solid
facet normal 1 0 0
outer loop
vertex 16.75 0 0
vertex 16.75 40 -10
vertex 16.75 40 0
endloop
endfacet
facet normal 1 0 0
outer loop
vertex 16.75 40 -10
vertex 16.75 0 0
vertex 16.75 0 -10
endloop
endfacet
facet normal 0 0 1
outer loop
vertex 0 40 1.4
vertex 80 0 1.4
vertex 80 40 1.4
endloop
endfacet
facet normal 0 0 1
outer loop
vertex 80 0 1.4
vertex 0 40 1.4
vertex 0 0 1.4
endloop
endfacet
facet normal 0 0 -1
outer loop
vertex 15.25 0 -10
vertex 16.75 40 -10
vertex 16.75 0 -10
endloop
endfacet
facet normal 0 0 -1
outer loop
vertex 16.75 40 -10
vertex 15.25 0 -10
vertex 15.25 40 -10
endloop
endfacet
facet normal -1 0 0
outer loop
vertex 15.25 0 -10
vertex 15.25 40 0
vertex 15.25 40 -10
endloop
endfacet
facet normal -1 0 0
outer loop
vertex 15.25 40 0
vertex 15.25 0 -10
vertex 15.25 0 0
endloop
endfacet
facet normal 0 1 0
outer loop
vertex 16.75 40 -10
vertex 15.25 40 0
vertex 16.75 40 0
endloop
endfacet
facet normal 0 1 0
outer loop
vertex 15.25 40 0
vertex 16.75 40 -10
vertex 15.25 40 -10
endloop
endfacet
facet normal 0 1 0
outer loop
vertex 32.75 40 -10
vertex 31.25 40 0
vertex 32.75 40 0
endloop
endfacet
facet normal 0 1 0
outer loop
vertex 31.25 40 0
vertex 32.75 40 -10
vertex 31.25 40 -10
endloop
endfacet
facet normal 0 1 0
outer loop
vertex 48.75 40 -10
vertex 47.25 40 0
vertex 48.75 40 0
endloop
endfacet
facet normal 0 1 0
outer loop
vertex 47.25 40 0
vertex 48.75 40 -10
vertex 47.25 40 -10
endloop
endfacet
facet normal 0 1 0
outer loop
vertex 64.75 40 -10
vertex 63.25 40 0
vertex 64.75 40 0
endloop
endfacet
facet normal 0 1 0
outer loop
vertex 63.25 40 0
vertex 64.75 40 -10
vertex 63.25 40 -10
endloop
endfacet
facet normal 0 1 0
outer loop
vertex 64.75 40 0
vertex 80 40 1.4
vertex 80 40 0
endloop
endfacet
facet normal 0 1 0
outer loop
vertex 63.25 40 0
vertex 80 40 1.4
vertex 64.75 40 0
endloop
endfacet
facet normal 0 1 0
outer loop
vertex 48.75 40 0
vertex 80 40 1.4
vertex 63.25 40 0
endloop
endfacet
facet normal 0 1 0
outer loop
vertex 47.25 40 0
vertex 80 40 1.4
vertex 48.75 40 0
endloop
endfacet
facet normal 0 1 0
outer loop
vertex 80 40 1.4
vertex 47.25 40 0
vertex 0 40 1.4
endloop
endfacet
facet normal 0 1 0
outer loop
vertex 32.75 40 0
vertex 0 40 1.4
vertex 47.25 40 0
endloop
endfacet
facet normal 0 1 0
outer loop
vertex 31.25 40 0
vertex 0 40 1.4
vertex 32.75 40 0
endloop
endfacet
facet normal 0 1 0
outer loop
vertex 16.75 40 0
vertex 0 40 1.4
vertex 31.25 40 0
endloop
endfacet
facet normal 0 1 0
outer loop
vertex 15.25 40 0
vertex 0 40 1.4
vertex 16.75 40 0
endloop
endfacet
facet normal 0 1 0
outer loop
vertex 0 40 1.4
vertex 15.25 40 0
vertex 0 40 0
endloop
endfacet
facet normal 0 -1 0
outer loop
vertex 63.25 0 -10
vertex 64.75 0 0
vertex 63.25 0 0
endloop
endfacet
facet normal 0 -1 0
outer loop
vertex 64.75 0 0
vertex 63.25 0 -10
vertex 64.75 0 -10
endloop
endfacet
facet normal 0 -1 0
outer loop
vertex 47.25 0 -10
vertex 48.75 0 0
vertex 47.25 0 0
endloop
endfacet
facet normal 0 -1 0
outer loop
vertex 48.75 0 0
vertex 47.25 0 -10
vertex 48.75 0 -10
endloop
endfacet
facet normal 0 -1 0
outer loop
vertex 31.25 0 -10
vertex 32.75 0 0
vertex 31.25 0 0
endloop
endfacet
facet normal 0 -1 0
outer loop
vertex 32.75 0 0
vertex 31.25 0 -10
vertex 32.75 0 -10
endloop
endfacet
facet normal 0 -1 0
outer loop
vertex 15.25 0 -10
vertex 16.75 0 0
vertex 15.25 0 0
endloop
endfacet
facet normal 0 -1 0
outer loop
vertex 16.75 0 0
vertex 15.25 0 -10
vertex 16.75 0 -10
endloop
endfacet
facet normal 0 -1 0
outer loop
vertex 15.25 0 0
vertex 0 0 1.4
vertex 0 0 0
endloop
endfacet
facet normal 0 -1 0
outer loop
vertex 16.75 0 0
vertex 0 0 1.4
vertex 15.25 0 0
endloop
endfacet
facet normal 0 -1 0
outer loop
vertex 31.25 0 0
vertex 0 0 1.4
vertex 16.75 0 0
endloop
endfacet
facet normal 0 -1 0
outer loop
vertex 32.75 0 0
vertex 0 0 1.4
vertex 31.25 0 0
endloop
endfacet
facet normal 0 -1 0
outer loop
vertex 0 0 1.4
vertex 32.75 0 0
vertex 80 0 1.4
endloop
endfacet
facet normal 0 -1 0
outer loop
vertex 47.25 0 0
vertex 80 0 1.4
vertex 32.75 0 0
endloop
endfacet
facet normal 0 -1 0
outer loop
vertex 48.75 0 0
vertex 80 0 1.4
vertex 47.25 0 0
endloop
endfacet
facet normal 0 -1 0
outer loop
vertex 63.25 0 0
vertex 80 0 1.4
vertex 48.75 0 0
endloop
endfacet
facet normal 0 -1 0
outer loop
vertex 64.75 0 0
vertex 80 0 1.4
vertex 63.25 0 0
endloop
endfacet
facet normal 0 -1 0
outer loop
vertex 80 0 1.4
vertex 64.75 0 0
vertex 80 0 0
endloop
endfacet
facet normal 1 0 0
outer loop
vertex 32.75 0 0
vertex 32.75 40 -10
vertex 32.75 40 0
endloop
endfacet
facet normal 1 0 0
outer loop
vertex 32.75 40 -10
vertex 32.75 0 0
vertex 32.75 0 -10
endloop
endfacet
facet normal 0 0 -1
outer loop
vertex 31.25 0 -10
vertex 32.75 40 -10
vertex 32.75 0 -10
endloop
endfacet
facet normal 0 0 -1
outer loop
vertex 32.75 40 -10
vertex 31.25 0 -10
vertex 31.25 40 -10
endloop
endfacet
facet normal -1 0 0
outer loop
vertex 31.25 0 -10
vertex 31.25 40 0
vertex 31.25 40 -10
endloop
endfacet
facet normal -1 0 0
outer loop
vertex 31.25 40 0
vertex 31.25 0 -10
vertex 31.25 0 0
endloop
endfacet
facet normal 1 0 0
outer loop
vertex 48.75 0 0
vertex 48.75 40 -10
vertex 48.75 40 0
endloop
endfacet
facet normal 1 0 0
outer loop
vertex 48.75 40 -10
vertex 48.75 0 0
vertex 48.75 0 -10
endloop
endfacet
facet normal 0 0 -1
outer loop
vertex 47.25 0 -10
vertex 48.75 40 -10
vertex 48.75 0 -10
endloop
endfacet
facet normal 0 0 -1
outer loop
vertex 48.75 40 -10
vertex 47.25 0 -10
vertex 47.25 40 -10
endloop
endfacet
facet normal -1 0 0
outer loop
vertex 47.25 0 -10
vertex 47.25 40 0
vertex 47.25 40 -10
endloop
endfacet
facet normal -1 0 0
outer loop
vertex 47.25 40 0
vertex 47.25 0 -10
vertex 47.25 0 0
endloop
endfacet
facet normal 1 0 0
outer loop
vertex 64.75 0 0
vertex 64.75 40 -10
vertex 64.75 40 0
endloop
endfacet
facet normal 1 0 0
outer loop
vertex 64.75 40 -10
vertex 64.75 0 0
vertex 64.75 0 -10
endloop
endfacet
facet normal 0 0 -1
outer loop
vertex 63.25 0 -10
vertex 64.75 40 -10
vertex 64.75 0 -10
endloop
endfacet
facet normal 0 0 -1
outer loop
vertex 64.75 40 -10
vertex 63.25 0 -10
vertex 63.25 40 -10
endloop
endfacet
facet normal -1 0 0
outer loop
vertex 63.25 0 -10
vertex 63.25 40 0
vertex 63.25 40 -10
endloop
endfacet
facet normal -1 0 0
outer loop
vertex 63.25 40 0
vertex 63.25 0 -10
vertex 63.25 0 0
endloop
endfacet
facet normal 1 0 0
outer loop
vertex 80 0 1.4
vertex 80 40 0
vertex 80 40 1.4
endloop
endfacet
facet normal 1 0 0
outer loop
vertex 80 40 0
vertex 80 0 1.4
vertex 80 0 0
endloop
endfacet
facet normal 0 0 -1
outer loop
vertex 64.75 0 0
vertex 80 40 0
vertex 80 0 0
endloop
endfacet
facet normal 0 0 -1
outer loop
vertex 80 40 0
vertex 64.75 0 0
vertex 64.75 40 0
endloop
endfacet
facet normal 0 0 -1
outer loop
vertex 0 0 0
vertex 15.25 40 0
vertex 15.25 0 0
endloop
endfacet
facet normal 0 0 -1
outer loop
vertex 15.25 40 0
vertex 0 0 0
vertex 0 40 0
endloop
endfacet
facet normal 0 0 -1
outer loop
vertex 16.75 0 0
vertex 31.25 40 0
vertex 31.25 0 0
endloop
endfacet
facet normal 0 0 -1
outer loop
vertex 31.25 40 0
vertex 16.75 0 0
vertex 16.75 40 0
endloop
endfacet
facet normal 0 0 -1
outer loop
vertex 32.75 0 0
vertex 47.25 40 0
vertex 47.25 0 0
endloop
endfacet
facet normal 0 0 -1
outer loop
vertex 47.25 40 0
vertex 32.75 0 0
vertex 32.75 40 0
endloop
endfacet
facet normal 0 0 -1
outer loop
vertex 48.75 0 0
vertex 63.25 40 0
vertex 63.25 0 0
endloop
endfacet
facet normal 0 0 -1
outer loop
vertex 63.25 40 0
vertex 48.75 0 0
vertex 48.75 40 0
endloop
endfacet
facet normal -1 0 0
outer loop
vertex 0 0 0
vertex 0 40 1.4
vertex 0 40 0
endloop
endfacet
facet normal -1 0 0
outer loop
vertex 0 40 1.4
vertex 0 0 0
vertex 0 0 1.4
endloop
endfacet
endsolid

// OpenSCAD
$fn = 32;

// ----------------------------------------------------------------------
// Ribbed panel: 1.4 mm panel
// ----------------------------------------------------------------------

// --- parameters (mm) ---
panel_l = 80;             // panel length, X
panel_w = 40;             // panel width, Y
panel_t = 1.4;            // panel thickness, Z
rib_t = 1.5;              // rib thickness
rib_h = 10;               // rib height below the panel
ribs = 4;                 // number of ribs

total_h = panel_t + rib_h;  // overall height

union() {
  cube([panel_l, panel_w, panel_t]);
  for (i = [1 : ribs])
    translate([i * panel_l / (ribs + 1) - rib_t / 2, 0, -rib_h])
      cube([rib_t, panel_w, rib_h + panel_t]);
}
